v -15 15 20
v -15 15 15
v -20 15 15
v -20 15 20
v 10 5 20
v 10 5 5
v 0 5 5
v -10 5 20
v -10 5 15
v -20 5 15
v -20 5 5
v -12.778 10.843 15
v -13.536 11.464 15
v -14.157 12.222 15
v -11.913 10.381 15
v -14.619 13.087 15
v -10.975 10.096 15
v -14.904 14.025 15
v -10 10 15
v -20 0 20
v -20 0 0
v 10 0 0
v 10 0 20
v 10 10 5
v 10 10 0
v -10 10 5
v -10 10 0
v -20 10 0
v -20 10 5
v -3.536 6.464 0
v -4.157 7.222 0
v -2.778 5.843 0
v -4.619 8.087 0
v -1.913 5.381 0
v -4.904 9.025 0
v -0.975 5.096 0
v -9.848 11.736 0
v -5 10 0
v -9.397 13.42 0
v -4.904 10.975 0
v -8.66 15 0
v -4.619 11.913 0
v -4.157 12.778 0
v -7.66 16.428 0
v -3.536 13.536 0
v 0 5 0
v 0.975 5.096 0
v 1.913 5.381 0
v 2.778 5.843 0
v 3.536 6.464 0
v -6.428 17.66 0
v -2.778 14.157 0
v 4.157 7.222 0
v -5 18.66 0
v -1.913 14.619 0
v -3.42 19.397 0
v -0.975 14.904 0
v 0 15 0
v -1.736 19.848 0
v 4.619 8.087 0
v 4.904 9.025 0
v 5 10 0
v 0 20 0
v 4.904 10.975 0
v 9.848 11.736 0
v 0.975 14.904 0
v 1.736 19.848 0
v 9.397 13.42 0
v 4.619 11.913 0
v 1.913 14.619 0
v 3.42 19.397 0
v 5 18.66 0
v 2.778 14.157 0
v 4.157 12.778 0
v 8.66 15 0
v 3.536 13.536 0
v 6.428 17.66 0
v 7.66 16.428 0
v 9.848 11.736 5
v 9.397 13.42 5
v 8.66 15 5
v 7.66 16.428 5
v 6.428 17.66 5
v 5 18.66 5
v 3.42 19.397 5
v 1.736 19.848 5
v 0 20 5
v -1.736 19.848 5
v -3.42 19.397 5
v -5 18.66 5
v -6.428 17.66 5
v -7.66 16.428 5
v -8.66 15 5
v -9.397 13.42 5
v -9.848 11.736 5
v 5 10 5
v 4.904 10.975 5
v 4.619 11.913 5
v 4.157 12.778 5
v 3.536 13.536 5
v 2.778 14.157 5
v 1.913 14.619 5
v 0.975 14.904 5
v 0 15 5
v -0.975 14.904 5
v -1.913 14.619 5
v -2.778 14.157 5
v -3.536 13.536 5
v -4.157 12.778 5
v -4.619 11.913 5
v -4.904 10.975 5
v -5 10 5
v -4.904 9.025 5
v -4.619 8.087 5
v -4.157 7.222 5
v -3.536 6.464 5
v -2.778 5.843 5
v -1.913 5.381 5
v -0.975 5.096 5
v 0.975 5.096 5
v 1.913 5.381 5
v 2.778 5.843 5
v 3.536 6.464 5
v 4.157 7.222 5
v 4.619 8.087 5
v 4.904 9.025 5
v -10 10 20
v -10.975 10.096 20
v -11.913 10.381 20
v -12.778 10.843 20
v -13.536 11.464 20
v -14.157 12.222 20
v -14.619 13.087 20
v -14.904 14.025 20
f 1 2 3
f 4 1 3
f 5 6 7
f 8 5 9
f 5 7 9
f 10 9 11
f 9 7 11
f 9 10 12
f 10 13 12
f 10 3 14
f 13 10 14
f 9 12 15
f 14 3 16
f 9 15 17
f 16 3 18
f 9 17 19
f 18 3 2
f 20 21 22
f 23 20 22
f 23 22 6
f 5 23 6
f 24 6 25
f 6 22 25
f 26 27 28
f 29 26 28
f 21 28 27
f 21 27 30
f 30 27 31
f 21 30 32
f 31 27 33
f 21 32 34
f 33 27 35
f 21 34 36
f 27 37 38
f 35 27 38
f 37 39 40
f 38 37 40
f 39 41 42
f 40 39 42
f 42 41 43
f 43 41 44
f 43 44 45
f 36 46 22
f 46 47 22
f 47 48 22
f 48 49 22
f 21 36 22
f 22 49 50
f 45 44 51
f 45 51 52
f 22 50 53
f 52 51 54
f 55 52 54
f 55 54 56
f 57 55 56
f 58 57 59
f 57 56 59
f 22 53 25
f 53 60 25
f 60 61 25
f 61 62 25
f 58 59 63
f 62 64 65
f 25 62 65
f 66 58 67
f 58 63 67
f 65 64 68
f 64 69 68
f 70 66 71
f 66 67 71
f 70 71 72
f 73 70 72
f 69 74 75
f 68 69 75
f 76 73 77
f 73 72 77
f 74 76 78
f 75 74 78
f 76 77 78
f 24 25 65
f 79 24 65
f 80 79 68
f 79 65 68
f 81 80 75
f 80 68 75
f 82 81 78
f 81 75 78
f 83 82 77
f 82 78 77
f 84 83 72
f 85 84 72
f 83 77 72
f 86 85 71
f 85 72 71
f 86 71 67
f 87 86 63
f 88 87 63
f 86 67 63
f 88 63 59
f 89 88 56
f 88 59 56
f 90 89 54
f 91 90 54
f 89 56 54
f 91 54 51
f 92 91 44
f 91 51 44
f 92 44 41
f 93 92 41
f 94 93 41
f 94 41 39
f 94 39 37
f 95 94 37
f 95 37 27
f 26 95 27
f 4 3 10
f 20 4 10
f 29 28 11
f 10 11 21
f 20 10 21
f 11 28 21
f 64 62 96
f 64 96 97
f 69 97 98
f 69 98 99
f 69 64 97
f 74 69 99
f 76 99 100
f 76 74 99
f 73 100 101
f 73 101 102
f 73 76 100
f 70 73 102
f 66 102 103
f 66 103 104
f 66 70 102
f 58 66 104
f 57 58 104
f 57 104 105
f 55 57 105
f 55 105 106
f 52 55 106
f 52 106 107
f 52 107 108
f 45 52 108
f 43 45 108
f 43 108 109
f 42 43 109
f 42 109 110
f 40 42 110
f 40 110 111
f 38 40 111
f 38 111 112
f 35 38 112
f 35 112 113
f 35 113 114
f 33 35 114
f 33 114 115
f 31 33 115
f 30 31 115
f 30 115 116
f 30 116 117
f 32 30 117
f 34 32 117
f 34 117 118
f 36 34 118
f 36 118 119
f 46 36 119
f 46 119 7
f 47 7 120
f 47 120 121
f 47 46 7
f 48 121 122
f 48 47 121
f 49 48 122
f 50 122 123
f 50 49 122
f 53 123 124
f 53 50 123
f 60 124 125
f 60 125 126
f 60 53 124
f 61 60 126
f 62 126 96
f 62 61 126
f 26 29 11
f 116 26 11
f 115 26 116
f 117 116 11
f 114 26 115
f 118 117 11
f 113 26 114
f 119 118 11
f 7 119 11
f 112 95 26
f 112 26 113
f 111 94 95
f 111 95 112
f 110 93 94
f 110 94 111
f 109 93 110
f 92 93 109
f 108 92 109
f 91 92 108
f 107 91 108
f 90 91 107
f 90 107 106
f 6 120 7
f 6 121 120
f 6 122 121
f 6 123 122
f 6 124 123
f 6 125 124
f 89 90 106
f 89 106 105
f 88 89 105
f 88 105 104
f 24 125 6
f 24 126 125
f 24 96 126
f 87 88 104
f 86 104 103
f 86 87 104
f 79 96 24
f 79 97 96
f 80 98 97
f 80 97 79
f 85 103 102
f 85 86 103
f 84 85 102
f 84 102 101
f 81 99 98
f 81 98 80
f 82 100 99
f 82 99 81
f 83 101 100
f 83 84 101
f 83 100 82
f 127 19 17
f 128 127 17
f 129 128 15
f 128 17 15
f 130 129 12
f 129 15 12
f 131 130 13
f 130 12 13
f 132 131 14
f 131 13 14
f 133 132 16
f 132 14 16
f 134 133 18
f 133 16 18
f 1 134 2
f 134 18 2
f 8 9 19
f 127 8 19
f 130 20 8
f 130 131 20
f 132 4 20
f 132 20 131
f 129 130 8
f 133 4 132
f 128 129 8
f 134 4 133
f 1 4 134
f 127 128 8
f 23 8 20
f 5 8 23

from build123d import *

# Parameters (mm, degrees)
SKETCH_1_R      = 5
EXTRUDE_1_DEPTH = 5
SKETCH_1_6_W    = 30
SKETCH_1_6_H    = 5
EXTRUDE_3_DEPTH = 20
EXTRUDE_START   = 15
EXTRUDE_4_DEPTH = 5


with BuildPart() as part:
    # 草圖1 → 填料-伸長1 (new body)
    with BuildSketch(Plane.XY):
        with BuildLine():
            ThreePointArc((10, 10), (0, 20), (-10, 10))
            Line((-10, 10), (-20, 10))
            Line((-20, 10), (-20, 0))
            Line((-20, 0), (10, 0))
            Line((10, 0), (10, 10))
        make_face()
        with Locations((0, 10)):
            Circle(SKETCH_1_R, mode=Mode.SUBTRACT)
    extrude(amount=EXTRUDE_1_DEPTH)

    # 草圖1<6> → 填料-伸長3 (add)
    with BuildSketch(Plane.XY):
        with Locations((-5, 2.5)):
            Rectangle(SKETCH_1_6_W, SKETCH_1_6_H)
    extrude(amount=EXTRUDE_3_DEPTH)

    # 草圖1<7> → 填料-伸長4 (add)
    with BuildSketch(Plane.XY.offset(EXTRUDE_START)):
        with BuildLine():
            Line((-10, 5), (-10, 10))
            ThreePointArc((-10, 10), (-13.535533906, 11.464466094), (-15, 15))
            Line((-15, 15), (-20, 15))
            Line((-20, 15), (-20, 5))
            Line((-20, 5), (-10, 5))
        make_face()
    extrude(amount=EXTRUDE_4_DEPTH)


solid = part.part
